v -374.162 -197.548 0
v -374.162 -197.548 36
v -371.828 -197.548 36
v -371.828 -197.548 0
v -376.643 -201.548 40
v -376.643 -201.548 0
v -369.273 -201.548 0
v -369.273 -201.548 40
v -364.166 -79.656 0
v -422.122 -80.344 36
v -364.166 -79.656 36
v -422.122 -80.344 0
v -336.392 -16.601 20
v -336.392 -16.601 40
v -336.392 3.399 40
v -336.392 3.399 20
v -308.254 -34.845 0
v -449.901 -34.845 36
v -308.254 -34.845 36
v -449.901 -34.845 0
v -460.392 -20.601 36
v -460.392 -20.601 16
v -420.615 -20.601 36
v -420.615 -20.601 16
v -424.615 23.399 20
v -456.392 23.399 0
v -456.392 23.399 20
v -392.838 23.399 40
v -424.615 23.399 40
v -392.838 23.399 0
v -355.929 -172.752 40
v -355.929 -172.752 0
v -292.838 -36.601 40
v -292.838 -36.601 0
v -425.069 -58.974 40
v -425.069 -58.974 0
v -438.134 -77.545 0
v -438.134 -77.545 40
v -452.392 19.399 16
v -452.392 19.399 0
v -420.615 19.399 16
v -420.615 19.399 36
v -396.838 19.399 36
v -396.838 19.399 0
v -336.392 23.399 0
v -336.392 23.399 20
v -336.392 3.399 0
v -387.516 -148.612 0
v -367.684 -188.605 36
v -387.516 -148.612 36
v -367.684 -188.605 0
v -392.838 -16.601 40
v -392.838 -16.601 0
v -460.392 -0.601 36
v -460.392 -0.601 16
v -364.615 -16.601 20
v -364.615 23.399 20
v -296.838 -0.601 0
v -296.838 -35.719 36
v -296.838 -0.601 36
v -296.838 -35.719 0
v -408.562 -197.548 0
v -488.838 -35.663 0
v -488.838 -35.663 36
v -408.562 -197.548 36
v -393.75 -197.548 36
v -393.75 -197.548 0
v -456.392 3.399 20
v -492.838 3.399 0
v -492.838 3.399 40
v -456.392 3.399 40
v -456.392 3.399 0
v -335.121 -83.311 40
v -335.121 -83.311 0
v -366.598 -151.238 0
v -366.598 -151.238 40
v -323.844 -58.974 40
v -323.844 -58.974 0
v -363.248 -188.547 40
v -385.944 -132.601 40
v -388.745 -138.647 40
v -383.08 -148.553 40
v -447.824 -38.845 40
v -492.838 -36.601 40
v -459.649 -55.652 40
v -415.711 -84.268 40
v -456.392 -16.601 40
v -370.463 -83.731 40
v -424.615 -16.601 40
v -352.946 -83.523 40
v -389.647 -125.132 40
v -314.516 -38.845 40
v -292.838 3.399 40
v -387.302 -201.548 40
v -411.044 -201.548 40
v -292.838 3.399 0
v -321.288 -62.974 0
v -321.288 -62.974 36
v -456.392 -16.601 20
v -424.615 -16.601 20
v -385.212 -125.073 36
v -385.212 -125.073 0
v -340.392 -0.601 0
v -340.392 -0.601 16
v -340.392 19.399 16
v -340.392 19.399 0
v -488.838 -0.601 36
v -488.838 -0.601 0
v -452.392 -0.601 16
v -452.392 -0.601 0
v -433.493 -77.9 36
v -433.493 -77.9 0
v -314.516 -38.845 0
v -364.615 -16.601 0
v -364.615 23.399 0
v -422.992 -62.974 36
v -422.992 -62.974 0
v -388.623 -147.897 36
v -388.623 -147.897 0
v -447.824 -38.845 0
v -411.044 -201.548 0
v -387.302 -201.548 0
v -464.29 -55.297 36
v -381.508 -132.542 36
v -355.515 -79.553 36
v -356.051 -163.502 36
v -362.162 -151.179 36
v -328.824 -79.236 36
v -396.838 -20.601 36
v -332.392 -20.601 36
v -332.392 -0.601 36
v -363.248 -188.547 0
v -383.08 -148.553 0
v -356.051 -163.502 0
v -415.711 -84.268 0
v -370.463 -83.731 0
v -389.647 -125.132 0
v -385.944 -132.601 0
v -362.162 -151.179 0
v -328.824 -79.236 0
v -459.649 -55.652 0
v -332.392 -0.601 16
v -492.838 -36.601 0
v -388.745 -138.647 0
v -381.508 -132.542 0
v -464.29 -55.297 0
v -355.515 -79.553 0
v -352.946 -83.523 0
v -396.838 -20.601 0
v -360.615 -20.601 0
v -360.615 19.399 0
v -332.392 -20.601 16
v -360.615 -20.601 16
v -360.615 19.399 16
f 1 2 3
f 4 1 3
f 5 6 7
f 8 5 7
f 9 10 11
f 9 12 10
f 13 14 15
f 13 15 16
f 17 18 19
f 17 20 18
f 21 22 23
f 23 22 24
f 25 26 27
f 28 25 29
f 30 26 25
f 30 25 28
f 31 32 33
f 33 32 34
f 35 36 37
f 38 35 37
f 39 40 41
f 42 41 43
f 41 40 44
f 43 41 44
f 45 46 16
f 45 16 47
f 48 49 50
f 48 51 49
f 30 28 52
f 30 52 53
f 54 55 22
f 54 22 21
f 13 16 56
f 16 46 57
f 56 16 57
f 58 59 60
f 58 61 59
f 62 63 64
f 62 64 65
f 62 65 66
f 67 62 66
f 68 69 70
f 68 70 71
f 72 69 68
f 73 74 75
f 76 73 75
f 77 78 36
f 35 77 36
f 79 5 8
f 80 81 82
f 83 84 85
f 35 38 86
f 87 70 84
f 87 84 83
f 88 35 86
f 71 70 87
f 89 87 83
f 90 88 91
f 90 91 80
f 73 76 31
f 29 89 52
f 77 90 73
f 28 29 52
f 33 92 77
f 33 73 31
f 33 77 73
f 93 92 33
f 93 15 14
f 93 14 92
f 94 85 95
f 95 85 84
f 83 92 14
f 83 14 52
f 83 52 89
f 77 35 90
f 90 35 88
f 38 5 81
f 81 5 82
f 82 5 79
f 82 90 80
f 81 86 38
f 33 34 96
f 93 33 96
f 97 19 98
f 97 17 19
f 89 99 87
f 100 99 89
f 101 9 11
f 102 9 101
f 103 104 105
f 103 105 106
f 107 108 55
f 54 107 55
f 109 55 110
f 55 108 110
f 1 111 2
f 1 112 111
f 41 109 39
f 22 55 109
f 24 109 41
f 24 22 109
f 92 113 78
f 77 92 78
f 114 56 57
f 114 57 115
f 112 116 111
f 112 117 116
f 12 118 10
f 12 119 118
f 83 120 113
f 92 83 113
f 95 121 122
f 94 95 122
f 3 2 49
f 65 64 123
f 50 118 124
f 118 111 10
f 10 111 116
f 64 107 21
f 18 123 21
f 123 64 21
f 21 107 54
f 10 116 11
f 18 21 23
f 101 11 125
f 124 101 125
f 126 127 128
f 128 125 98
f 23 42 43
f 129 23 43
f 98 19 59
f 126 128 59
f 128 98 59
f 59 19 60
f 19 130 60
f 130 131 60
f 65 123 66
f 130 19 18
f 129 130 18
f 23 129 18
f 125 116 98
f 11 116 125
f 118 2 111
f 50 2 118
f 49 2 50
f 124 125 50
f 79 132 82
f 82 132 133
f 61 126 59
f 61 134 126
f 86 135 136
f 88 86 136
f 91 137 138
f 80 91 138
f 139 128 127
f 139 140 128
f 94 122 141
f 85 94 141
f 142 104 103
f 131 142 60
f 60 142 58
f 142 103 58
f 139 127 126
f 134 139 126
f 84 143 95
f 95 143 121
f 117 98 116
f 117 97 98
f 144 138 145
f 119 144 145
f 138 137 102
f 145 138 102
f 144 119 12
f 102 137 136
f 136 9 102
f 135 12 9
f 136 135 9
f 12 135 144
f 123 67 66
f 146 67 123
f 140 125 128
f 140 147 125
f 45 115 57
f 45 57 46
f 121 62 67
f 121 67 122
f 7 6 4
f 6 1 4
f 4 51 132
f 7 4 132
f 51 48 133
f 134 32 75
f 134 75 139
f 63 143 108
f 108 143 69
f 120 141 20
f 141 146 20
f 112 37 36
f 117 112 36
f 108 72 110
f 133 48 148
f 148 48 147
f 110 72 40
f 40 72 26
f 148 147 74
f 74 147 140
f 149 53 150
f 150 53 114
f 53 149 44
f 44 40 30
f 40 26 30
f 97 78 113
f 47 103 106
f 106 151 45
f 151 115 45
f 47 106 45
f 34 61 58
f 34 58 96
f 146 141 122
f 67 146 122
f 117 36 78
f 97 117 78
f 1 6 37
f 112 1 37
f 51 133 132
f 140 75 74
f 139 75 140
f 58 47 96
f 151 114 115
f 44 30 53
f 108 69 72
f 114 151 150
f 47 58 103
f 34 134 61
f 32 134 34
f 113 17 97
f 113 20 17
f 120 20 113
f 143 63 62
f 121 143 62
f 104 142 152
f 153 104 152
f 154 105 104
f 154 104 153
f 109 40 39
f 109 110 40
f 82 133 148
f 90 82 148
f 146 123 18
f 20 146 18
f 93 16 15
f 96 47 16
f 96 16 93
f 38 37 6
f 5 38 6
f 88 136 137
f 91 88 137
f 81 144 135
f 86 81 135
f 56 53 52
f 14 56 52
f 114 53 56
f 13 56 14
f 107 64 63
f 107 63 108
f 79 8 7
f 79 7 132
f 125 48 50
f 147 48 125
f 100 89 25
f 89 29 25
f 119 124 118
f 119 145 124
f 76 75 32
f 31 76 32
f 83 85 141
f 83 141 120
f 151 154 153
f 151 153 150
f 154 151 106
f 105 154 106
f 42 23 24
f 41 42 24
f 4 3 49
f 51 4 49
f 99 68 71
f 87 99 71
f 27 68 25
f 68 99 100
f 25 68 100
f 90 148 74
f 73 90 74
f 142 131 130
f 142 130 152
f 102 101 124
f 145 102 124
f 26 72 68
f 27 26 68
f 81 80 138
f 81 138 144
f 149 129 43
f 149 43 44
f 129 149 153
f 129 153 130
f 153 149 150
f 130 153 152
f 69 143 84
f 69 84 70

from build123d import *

# Parameters (mm, degrees)
EXTRUDE_1_DEPTH     = 40
EXTRUDE_5_DEPTH     = 20
CUT_EXTRUDE_1_DEPTH = 20
SHELL_1_T           = -4


with BuildPart() as part:
    # 草图2 → 凸台-拉伸1 (new body)
    with BuildSketch(Plane.XY):
        Polygon((-492.83766907737134, 3.399363384602765), (-492.83766907737134, -36.600636615400134), (-411.04350764937084, -201.54780387004163), (-387.3021178796635, -201.54780387004163), (-459.64889501148184, -55.65235437147672), (-447.824430393232, -38.845349288689015), (-314.51618126146934, -38.84534928868898), (-323.84350707219164, -58.973746582631264), (-425.06859632409555, -58.973746582631264), (-438.13417767710234, -77.54484466606092), (-376.6434698856671, -201.54780387004163), (-369.27276463278196, -201.54780387004163), (-363.24825517120325, -188.54689424122049), (-383.08030790431167, -148.55331936912614), (-352.9457720883425, -83.52289998835491), (-335.1213284507255, -83.31131920781937), (-366.59780107826595, -151.23764228433387), (-355.9291354649939, -172.7522117911716), (-292.83766907737163, -36.600636615400134), (-292.83766907737163, 3.399363384602765), align=None)
        Polygon((-388.745435454288, -138.64702410749163), (-415.7109887551389, -84.26793942985627), (-370.4625020076991, -83.73082812704564), (-389.6473299690999, -125.13174485915943), (-385.9436191741513, -132.60069610569766), align=None, mode=Mode.SUBTRACT)
    extrude(amount=EXTRUDE_1_DEPTH)

    # 草图3 → 凸台-拉伸5 (add)
    with BuildSketch(Plane(origin=(0, 3.399363384602765, 0), x_dir=(1, 0, 0), z_dir=(0, 1, 0))):
        Polygon((-336.3917831998655, -20.00000000000003), (-336.3917831998655, -5.981e-14), (-364.61472613861844, -3.469e-14), (-364.61472613861844, -20.000000000000018), align=None)
        Polygon((-392.8376690773715, -3.469e-14), (-456.3917831998654, -3.469e-14), (-456.3917831998654, -20.00000000000002), (-424.61472613861844, -20.00000000000001), (-424.61472613861844, -40), (-392.8376690773715, -39.999999999999986), align=None)
    extrude(amount=EXTRUDE_5_DEPTH)

    # 草图3<6> → 切除-拉伸1 (cut)
    with BuildSketch(Plane(origin=(0, 3.399363384602765, 0), x_dir=(1, 0, 0), z_dir=(0, 1, 0))):
        Polygon((-364.61472613861844, -20.000000000000018), (-364.61472613861844, -6.04e-14), (-392.8376690773715, -3.469e-14), (-392.8376690773715, -39.99999999999998), (-336.3917831998655, -39.99999999999998), (-336.3917831998655, -20.00000000000003), align=None)
        Polygon((-424.61472613861844, -20.00000000000001), (-456.39178319986536, -20.000000000000014), (-456.3917831998654, -40.00000000000006), (-424.61472613861844, -39.99999999999999), align=None)
    extrude(amount=-CUT_EXTRUDE_1_DEPTH, mode=Mode.SUBTRACT)

    # 抽壳1
    shell_1_openings = [part.faces().sort_by_distance(p)[0] for p in [
        (-393.958302549, -65.824912477, 0),
    ]]
    offset(amount=SHELL_1_T, openings=shell_1_openings, kind=Kind.INTERSECTION)


solid = part.part
